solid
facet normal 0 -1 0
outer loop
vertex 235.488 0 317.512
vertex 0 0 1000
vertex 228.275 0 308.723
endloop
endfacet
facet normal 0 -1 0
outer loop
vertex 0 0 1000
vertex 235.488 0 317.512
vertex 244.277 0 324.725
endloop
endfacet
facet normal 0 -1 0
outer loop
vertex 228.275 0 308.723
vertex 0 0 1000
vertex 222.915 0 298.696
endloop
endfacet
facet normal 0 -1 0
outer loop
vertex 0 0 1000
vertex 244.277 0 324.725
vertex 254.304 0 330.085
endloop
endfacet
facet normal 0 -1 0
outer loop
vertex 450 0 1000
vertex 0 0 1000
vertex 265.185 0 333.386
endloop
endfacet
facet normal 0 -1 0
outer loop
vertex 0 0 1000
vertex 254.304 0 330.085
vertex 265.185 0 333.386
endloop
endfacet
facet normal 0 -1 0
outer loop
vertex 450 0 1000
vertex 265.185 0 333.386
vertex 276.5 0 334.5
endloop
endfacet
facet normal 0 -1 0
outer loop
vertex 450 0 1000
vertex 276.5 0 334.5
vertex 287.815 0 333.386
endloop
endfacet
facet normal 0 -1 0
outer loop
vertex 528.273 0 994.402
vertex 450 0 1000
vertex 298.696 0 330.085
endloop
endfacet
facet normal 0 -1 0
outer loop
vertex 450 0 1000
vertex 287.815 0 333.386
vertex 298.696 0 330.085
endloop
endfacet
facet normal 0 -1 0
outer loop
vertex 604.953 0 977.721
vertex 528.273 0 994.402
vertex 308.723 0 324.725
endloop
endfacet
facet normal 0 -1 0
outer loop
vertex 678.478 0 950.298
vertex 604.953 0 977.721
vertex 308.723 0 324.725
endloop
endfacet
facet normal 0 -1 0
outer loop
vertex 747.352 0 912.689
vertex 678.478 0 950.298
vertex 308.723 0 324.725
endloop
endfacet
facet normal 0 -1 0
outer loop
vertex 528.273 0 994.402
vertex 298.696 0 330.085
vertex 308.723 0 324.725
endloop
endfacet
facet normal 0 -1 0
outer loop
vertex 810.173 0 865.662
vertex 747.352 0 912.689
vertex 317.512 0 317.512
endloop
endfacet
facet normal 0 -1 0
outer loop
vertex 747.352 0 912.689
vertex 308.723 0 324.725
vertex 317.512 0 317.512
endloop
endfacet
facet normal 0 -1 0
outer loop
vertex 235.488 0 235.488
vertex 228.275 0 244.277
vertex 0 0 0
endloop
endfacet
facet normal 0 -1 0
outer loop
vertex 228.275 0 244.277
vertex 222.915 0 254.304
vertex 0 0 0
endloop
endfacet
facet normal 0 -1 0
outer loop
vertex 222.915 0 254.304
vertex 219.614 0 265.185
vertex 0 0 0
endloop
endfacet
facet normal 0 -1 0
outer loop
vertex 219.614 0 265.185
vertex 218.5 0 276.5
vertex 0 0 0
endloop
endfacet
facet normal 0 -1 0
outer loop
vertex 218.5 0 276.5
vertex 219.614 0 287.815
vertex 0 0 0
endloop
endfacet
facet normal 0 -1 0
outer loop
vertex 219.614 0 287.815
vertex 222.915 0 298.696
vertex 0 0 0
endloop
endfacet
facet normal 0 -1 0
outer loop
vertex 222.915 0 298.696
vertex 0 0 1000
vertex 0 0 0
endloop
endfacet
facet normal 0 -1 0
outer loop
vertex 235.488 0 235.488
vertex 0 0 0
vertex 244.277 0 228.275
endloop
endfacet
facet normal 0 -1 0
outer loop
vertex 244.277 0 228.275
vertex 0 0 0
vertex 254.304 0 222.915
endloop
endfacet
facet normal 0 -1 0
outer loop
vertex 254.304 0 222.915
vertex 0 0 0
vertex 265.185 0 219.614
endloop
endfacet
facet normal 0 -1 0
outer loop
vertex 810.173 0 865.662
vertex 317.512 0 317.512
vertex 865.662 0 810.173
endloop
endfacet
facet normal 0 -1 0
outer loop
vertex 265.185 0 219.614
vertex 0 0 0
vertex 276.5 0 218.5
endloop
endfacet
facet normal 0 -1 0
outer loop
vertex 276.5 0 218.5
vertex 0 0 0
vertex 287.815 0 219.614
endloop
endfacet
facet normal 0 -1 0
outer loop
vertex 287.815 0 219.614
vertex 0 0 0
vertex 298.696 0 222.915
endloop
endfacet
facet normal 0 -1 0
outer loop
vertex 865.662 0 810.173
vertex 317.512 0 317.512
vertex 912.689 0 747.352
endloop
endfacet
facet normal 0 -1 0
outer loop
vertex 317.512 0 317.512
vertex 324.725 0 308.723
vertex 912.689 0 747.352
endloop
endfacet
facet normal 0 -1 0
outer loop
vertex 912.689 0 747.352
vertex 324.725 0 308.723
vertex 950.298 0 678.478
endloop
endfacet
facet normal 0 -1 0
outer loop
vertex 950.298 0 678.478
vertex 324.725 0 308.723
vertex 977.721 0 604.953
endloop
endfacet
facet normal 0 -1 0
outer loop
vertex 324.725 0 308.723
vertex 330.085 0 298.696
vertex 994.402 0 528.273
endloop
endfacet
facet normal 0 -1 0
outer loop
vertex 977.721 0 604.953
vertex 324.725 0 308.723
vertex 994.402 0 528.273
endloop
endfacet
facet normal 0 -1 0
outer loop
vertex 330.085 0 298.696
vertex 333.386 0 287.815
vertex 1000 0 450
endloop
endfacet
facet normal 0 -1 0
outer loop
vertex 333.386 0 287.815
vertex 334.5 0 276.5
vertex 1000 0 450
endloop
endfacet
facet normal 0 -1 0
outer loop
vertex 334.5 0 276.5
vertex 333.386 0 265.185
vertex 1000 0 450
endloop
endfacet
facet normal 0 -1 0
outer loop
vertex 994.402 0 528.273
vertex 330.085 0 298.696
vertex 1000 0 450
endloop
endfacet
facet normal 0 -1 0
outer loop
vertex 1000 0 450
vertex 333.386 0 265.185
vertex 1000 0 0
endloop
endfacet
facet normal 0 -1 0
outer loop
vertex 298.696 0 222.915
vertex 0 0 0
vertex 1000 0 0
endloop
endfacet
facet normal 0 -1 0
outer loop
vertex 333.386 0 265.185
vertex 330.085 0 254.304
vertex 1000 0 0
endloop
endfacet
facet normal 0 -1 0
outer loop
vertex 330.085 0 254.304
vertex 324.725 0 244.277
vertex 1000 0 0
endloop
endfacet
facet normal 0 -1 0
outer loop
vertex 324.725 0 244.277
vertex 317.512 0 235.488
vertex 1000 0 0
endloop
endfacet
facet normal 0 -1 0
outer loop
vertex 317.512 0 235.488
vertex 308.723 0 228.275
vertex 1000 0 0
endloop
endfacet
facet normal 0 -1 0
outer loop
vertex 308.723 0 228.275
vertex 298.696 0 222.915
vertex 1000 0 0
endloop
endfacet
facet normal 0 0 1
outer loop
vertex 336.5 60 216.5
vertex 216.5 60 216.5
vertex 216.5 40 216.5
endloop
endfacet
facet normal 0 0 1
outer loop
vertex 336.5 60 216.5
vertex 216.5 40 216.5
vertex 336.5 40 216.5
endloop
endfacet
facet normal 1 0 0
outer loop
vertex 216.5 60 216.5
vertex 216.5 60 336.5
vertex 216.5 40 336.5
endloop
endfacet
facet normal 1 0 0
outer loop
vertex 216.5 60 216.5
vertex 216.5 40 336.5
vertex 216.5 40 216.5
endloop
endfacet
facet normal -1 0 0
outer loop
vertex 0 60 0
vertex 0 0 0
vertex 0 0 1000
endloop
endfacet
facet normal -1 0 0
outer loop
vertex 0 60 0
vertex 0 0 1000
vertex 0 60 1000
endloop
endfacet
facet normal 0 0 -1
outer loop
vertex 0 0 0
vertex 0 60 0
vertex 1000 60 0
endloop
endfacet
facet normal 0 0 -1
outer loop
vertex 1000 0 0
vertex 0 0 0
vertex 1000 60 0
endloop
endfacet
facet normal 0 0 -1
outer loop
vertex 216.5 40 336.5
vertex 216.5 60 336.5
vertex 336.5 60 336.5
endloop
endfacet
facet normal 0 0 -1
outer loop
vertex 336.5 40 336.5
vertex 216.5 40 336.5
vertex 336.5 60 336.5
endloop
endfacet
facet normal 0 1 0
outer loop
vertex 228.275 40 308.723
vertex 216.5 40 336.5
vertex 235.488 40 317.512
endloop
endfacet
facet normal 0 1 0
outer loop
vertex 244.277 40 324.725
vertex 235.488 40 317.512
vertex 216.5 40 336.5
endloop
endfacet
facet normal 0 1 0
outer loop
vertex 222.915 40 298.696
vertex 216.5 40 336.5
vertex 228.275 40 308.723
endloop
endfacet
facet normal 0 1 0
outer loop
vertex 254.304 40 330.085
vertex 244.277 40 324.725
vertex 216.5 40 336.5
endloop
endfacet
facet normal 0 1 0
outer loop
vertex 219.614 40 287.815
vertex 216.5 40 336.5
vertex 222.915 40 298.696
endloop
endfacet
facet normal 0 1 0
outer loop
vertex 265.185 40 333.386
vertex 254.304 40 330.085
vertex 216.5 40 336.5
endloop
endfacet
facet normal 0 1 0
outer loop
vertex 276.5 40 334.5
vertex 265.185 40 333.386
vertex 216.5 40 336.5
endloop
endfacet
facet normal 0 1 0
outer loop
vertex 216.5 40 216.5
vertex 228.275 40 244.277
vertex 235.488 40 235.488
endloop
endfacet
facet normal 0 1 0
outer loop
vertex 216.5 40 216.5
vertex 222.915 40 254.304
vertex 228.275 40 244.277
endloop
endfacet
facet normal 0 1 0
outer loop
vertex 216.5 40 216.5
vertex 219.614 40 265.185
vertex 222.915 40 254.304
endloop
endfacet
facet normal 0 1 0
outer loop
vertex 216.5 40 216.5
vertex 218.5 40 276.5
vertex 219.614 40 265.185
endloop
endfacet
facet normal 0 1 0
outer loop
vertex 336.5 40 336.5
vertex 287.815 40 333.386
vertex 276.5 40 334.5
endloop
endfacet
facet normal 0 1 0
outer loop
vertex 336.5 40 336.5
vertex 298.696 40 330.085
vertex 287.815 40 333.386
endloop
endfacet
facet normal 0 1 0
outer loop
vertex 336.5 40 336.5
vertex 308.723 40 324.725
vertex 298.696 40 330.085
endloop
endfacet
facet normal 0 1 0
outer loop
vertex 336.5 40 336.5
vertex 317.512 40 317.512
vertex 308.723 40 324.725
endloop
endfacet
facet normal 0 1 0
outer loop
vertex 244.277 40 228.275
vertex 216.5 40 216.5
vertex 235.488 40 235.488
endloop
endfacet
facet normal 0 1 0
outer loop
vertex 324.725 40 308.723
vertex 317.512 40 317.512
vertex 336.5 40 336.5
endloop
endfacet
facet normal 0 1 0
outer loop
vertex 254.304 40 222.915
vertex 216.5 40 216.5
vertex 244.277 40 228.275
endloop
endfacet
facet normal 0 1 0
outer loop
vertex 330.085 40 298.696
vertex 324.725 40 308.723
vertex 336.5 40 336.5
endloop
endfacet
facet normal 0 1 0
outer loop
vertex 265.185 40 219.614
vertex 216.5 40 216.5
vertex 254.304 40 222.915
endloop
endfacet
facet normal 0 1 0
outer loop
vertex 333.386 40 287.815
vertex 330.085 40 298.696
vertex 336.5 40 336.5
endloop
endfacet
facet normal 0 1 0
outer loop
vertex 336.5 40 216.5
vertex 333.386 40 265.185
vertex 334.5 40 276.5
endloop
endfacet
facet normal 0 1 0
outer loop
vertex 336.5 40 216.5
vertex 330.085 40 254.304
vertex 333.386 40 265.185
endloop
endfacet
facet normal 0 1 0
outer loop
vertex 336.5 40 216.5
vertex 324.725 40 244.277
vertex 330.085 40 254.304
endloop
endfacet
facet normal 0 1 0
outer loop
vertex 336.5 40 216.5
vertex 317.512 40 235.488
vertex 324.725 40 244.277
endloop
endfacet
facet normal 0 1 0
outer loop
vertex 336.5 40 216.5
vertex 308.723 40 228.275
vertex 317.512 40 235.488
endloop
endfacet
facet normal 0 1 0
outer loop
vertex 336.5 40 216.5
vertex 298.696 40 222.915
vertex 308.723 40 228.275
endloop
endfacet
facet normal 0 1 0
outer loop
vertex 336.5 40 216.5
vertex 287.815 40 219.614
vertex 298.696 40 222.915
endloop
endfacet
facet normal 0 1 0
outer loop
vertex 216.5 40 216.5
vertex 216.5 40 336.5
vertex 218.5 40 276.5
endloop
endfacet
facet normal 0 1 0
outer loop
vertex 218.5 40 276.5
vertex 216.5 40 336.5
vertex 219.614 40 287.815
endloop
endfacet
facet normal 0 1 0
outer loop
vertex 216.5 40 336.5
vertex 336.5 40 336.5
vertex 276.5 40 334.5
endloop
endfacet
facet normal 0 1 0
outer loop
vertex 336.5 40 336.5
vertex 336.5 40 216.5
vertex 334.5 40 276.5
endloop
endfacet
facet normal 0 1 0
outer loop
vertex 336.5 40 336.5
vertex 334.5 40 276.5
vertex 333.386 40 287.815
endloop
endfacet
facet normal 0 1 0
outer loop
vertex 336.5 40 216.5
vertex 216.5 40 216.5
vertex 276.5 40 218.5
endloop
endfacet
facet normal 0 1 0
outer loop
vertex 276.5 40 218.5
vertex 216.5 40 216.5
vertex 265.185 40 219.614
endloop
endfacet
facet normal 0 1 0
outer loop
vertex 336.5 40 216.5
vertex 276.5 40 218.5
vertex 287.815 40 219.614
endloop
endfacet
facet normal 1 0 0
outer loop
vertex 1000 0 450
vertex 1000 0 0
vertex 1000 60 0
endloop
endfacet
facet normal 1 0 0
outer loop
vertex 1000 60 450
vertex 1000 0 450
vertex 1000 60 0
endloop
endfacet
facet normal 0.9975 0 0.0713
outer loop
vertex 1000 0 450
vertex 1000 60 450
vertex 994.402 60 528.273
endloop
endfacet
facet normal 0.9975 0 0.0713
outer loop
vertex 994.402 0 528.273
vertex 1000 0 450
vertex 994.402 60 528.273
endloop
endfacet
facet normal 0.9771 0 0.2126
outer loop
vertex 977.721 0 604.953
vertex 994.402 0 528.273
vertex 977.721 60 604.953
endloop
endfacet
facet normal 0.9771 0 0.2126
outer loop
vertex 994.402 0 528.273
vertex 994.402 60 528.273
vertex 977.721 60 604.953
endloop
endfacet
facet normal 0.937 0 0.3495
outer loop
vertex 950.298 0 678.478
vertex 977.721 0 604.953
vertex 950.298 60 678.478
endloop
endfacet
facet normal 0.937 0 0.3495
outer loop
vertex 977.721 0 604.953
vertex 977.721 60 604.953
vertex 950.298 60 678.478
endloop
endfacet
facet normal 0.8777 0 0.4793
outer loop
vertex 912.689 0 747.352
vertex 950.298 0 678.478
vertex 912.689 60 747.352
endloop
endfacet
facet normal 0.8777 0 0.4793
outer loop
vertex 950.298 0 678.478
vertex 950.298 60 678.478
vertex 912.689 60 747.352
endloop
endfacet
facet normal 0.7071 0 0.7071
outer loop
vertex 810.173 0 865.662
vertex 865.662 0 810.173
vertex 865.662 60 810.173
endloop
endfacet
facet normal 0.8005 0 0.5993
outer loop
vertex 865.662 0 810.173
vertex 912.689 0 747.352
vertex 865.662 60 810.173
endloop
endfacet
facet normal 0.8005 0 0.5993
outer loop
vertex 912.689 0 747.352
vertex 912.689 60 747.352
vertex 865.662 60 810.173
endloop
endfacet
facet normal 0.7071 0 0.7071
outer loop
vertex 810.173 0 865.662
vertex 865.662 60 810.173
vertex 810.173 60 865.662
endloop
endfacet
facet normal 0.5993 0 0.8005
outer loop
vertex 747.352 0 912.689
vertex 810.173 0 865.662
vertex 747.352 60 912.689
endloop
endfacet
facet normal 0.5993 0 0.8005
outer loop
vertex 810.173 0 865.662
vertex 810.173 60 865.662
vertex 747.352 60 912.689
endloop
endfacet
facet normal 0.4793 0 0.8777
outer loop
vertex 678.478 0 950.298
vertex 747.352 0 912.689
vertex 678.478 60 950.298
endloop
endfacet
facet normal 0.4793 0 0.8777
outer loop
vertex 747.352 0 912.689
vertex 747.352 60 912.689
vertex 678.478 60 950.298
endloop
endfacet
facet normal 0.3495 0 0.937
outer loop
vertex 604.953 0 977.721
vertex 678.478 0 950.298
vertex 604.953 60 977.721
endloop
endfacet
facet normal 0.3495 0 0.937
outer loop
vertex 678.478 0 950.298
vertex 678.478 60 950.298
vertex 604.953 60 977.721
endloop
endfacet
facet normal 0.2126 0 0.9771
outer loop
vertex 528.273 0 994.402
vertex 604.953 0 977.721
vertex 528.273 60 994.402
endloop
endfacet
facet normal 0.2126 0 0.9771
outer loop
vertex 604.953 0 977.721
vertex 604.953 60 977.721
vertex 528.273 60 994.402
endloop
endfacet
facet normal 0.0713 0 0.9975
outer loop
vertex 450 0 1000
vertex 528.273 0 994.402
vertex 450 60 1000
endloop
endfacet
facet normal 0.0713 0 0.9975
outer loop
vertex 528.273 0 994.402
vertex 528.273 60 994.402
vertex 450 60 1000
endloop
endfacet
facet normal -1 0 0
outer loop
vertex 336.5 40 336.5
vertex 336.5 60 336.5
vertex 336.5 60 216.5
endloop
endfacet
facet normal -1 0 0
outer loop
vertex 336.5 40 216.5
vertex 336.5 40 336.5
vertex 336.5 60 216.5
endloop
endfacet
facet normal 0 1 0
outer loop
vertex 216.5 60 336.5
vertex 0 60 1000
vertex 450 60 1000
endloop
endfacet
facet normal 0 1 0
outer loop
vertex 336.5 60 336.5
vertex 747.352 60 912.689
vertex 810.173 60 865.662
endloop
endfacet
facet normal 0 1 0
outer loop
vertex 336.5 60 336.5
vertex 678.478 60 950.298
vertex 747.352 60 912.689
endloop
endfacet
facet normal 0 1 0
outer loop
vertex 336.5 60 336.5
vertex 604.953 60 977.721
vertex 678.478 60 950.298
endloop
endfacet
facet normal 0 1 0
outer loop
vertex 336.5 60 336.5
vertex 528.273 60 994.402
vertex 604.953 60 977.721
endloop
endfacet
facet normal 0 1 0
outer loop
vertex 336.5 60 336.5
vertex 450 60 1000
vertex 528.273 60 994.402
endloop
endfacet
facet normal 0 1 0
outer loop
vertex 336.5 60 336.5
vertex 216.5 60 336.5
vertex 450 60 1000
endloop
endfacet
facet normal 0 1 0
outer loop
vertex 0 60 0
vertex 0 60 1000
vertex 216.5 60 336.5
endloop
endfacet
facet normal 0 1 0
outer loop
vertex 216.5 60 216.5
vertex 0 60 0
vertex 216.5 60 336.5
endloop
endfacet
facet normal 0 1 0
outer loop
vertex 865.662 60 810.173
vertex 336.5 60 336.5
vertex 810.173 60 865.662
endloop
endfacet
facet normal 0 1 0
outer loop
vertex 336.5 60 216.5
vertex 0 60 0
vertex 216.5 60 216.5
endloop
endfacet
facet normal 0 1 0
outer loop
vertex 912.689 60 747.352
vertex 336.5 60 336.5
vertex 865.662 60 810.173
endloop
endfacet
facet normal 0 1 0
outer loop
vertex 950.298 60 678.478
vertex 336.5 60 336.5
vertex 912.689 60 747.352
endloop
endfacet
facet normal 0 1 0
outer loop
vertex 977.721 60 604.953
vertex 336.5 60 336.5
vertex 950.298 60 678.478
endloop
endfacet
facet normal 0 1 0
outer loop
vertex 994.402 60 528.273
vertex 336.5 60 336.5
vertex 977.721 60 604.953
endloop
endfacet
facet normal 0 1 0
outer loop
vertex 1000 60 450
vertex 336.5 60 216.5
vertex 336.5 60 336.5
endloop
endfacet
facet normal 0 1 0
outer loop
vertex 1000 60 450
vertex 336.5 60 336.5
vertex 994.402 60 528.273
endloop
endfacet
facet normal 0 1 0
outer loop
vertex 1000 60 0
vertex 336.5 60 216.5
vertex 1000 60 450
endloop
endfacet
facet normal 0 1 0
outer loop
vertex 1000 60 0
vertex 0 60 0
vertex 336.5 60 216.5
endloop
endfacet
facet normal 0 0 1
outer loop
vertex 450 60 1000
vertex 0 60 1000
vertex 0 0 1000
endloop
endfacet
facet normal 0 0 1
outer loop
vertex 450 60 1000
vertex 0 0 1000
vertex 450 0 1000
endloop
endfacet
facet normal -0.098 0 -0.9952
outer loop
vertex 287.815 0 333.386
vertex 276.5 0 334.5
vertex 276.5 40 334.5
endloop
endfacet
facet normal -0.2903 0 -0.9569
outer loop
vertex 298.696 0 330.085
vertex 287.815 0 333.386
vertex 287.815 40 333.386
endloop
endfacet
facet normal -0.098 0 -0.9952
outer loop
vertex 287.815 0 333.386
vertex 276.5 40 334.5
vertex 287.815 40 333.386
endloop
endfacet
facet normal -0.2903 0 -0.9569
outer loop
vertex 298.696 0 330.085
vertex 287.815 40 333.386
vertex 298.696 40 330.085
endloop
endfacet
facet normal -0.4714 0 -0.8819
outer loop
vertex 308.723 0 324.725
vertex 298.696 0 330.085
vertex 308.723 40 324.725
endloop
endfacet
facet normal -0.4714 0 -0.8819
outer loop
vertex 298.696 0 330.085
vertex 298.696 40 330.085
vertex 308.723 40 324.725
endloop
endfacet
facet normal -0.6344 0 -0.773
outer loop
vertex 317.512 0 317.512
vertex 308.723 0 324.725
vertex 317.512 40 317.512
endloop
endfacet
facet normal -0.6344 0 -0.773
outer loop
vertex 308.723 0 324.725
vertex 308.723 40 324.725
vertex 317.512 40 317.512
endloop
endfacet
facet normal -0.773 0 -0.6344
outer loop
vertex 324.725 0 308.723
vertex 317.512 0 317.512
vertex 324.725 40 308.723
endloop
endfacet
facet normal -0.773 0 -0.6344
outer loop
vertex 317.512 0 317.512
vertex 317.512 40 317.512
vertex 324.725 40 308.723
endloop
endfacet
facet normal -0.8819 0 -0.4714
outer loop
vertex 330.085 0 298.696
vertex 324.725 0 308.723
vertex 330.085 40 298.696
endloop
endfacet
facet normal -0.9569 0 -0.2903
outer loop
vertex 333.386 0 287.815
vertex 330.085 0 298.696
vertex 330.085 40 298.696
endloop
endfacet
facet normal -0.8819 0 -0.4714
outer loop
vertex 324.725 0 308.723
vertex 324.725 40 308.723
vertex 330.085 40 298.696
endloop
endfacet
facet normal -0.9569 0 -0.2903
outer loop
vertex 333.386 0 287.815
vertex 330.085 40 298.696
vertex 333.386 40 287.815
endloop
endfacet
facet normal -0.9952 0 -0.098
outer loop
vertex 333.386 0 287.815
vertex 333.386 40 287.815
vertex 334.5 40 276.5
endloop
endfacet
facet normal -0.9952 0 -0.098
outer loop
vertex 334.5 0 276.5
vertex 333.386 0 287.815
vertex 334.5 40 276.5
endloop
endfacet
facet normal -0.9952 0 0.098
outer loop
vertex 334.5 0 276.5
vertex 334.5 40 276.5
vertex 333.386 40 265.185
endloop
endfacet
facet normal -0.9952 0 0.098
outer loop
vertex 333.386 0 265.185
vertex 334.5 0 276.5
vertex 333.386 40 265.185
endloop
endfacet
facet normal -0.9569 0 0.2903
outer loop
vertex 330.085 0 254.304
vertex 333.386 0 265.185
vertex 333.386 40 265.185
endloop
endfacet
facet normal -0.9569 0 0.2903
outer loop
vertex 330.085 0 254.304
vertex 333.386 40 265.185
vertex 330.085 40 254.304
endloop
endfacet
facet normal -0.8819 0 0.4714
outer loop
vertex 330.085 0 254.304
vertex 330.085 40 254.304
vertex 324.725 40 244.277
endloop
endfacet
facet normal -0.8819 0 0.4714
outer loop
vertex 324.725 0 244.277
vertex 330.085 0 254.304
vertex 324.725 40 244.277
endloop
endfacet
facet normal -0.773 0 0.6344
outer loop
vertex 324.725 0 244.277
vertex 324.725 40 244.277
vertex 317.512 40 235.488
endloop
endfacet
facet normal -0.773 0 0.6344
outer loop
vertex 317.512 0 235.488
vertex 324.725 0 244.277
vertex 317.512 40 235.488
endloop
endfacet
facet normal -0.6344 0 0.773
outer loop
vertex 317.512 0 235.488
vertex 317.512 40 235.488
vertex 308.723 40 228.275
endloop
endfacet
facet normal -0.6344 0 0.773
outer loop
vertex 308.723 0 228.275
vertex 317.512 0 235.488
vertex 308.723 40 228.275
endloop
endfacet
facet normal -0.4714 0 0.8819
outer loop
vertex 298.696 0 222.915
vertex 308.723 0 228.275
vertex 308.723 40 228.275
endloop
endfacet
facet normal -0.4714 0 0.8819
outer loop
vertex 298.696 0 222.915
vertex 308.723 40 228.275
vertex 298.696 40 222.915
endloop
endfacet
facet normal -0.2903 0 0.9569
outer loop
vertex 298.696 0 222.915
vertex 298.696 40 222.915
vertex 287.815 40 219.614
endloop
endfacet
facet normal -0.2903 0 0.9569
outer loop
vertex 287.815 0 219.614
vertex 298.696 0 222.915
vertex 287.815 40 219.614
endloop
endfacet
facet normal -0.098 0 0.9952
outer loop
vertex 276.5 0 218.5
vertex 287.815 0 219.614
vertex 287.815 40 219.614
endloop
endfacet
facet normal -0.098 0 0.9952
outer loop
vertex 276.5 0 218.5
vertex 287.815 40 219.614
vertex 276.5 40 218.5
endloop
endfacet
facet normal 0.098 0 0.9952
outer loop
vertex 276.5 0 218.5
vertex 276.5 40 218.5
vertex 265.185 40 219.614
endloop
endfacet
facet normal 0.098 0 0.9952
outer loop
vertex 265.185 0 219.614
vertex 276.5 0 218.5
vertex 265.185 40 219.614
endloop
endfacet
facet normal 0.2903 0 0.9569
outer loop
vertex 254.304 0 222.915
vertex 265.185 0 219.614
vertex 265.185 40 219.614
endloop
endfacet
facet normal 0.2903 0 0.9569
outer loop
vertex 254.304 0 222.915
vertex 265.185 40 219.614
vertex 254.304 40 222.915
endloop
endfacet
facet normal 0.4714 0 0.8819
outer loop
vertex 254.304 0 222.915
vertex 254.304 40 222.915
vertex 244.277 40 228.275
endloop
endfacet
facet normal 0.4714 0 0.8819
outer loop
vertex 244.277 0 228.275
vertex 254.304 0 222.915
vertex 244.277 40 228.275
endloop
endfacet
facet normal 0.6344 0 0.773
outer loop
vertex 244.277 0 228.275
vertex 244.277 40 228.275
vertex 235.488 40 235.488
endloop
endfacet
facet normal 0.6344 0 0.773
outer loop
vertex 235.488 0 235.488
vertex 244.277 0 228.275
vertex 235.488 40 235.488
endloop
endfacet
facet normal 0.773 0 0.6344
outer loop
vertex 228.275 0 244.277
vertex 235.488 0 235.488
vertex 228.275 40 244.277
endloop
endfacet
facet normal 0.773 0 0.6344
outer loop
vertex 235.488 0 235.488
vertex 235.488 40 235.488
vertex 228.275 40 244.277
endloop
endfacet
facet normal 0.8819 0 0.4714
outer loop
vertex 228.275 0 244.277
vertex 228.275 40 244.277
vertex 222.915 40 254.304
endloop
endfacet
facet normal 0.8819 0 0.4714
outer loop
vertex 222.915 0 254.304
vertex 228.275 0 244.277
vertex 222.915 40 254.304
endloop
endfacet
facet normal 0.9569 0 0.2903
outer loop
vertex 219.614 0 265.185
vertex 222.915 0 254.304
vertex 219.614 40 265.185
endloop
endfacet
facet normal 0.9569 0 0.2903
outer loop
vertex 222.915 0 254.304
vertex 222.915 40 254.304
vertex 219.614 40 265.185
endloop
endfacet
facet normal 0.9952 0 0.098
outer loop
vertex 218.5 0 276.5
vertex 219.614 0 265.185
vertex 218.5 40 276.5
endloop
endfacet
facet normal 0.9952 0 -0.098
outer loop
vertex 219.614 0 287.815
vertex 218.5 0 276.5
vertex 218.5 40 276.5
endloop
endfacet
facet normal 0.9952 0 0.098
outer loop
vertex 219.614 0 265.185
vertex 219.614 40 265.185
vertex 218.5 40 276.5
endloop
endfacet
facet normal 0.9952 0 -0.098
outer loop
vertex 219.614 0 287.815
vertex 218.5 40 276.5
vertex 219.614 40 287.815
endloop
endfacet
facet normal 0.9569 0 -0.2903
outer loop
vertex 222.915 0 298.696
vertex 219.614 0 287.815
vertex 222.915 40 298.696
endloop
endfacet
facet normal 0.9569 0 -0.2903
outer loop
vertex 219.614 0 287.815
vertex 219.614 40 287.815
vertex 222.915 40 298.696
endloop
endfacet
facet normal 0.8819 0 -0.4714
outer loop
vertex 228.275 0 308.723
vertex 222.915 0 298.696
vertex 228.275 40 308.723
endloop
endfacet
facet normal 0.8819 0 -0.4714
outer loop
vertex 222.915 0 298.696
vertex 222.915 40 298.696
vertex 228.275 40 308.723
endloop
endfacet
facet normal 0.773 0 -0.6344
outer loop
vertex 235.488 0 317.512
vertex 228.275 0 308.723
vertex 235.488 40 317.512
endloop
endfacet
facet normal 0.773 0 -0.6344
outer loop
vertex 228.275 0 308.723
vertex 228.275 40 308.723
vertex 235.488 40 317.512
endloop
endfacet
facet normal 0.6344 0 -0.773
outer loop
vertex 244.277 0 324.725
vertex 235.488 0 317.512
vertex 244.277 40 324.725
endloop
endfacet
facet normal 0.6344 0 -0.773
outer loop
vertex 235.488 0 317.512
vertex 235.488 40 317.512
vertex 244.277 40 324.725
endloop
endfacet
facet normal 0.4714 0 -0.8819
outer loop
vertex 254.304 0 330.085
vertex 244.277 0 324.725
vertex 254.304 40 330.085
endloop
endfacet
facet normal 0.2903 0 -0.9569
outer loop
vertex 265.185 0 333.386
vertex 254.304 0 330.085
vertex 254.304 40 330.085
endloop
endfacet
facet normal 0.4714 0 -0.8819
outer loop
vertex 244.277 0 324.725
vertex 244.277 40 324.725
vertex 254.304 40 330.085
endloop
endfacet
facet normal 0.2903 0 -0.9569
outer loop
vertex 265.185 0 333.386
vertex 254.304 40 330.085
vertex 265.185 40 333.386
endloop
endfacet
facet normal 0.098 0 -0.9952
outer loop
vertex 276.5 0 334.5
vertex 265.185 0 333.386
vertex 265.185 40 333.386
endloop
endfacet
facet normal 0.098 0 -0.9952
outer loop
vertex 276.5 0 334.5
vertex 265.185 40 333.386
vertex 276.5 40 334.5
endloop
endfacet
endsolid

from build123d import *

# Parameters (mm, degrees)
SKIZZE1_W                       = 1000
SKIZZE1_H                       = 60
AUFSATZ_LINEAR_AUSTRAGEN1_DEPTH = 1000
SCHNITT_LINEAR_AUSTRAGEN1_DEPTH = 1000
SKIZZE3_R                       = 58
SCHNITT_LINEAR_AUSTRAGEN2_DEPTH = 61
SKIZZE4_W                       = 120
SKIZZE4_H                       = 120
SCHNITT_LINEAR_AUSTRAGEN3_DEPTH = 20


with BuildPart() as part:
    # Skizze1 → Aufsatz-Linear austragen1 (new body)
    with BuildSketch(Plane.XY):
        with Locations((500, 30)):
            Rectangle(SKIZZE1_W, SKIZZE1_H)
    extrude(amount=AUFSATZ_LINEAR_AUSTRAGEN1_DEPTH)

    # Skizze2 → Schnitt-Linear austragen1 (cut)
    with BuildSketch(Plane(origin=(0, 60, 0), x_dir=(1, 0, 0), z_dir=(0, 1, 0))):
        with BuildLine():
            Line((1000, -1000), (1000, -450))
            ThreePointArc((1000, -450), (838.908729653, -838.908729653), (450, -1000))
            Line((450, -1000), (1000, -1000))
        make_face()
    extrude(amount=-SCHNITT_LINEAR_AUSTRAGEN1_DEPTH, mode=Mode.SUBTRACT)

    # Skizze3 → Schnitt-Linear austragen2 (cut, through all)
    with BuildSketch(Plane(origin=(0, 60, 0), x_dir=(1, 0, 0), z_dir=(0, 1, 0))):
        with Locations(Location((276.5, -276.5, 0), (0, 0, 270))):  # turned: the seam where the file's is
            Circle(SKIZZE3_R)
    extrude(amount=-SCHNITT_LINEAR_AUSTRAGEN2_DEPTH, mode=Mode.SUBTRACT)

    # Skizze4 → Schnitt-Linear austragen3 (cut)
    with BuildSketch(Plane(origin=(0, 60, 0), x_dir=(1, 0, 0), z_dir=(0, 1, 0))):
        with Locations((276.5, -276.5)):
            Rectangle(SKIZZE4_W, SKIZZE4_H)
    extrude(amount=-SCHNITT_LINEAR_AUSTRAGEN3_DEPTH, mode=Mode.SUBTRACT)


solid = part.part
